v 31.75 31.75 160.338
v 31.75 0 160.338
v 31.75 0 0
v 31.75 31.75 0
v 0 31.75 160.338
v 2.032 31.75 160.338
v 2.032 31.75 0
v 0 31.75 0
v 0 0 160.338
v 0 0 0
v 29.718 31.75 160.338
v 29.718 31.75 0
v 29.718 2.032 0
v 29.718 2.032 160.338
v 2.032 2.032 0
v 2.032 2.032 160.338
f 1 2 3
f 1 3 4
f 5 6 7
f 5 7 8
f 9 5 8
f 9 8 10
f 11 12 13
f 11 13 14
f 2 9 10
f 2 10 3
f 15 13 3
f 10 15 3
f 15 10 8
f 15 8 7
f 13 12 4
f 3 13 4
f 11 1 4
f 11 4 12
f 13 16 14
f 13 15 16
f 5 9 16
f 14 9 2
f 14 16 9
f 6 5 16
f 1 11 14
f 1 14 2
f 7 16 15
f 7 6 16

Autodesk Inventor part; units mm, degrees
ref_plane "YZ Plane" through (0, 0, 0) normal (1, 0, 0) x (0, 1, 0)
ref_plane "XZ Plane" through (0, 0, 0) normal (0, 1, 0) x (-1, 0, 0)
ref_plane "XY Plane" through (0, 0, 0) normal (0, 0, 1) x (1, 0, 0)
sketch "Sketch1" plane through (0, 0, 0) normal (0, 0, 1) x (1, 0, 0)
  line L0 (0, 0) -> (31.75, 0)
  line L1 (31.75, 0) -> (31.75, 31.75)
  line L2 (31.75, 31.75) -> (0, 31.75)
  line L3 (0, 31.75) -> (0, 0)
  dimension "d0" = 31.75
  dimension "d1" = 31.75
extrude "Extrusion1" add sketch "Sketch1" along normal blind 160.3375
sketch "Sketch2" plane through (0, 0, 160.3375) normal (0, 0, 1) x (1, 0, 0)
  circle A0 centre (15.875, 15.875) radius 2.54
  line L0 (31.75, 31.75) -> (0, 31.75) projected
  line L1 (0, 0) -> (31.75, 0) projected
  line L2 (0, 31.75) -> (0, 0) projected
  dimension "d4" = 5.08
  dimension "d5" = 31.75
  dimension "d6" = 15.875
  dimension "d7" = 15.875
extrude "Extrusion2" cut sketch "Sketch2" against normal through all
sketch "Sketch3" plane through (0, 31.75, 0) normal (0, 1, 0) x (1, 0, 0)
  line L0 (31.75, 0) -> (0, 0) projected
  line L1 (0, 0) -> (0, -160.3375) projected
  line L2 (31.75, 0) -> (31.75, -160.3375) projected
  line L3 (31.75, -160.3375) -> (0, -160.3375) projected
  line L4 (2.032, 0) -> (29.718, 0)
  line L5 (29.718, 0) -> (29.718, -160.3375)
  line L6 (29.718, -160.3375) -> (2.032, -160.3375)
  line L7 (2.032, -160.3375) -> (2.032, 0)
  dimension "d10" = 0
  dimension "d11" = 2.032
  dimension "d12" = 2.032
  dimension "d13" = 0
extrude "Extrusion3" cut sketch "Sketch3" against normal blind 29.718 contours L5 L3 L7 L0
equation "\"d1\" = d0"
equation "\"d6\" = 0.5 * d5"
equation "\"d7\" = d6"
equation "\"d12\" = d11"
properties part number "Claw holding bars"
